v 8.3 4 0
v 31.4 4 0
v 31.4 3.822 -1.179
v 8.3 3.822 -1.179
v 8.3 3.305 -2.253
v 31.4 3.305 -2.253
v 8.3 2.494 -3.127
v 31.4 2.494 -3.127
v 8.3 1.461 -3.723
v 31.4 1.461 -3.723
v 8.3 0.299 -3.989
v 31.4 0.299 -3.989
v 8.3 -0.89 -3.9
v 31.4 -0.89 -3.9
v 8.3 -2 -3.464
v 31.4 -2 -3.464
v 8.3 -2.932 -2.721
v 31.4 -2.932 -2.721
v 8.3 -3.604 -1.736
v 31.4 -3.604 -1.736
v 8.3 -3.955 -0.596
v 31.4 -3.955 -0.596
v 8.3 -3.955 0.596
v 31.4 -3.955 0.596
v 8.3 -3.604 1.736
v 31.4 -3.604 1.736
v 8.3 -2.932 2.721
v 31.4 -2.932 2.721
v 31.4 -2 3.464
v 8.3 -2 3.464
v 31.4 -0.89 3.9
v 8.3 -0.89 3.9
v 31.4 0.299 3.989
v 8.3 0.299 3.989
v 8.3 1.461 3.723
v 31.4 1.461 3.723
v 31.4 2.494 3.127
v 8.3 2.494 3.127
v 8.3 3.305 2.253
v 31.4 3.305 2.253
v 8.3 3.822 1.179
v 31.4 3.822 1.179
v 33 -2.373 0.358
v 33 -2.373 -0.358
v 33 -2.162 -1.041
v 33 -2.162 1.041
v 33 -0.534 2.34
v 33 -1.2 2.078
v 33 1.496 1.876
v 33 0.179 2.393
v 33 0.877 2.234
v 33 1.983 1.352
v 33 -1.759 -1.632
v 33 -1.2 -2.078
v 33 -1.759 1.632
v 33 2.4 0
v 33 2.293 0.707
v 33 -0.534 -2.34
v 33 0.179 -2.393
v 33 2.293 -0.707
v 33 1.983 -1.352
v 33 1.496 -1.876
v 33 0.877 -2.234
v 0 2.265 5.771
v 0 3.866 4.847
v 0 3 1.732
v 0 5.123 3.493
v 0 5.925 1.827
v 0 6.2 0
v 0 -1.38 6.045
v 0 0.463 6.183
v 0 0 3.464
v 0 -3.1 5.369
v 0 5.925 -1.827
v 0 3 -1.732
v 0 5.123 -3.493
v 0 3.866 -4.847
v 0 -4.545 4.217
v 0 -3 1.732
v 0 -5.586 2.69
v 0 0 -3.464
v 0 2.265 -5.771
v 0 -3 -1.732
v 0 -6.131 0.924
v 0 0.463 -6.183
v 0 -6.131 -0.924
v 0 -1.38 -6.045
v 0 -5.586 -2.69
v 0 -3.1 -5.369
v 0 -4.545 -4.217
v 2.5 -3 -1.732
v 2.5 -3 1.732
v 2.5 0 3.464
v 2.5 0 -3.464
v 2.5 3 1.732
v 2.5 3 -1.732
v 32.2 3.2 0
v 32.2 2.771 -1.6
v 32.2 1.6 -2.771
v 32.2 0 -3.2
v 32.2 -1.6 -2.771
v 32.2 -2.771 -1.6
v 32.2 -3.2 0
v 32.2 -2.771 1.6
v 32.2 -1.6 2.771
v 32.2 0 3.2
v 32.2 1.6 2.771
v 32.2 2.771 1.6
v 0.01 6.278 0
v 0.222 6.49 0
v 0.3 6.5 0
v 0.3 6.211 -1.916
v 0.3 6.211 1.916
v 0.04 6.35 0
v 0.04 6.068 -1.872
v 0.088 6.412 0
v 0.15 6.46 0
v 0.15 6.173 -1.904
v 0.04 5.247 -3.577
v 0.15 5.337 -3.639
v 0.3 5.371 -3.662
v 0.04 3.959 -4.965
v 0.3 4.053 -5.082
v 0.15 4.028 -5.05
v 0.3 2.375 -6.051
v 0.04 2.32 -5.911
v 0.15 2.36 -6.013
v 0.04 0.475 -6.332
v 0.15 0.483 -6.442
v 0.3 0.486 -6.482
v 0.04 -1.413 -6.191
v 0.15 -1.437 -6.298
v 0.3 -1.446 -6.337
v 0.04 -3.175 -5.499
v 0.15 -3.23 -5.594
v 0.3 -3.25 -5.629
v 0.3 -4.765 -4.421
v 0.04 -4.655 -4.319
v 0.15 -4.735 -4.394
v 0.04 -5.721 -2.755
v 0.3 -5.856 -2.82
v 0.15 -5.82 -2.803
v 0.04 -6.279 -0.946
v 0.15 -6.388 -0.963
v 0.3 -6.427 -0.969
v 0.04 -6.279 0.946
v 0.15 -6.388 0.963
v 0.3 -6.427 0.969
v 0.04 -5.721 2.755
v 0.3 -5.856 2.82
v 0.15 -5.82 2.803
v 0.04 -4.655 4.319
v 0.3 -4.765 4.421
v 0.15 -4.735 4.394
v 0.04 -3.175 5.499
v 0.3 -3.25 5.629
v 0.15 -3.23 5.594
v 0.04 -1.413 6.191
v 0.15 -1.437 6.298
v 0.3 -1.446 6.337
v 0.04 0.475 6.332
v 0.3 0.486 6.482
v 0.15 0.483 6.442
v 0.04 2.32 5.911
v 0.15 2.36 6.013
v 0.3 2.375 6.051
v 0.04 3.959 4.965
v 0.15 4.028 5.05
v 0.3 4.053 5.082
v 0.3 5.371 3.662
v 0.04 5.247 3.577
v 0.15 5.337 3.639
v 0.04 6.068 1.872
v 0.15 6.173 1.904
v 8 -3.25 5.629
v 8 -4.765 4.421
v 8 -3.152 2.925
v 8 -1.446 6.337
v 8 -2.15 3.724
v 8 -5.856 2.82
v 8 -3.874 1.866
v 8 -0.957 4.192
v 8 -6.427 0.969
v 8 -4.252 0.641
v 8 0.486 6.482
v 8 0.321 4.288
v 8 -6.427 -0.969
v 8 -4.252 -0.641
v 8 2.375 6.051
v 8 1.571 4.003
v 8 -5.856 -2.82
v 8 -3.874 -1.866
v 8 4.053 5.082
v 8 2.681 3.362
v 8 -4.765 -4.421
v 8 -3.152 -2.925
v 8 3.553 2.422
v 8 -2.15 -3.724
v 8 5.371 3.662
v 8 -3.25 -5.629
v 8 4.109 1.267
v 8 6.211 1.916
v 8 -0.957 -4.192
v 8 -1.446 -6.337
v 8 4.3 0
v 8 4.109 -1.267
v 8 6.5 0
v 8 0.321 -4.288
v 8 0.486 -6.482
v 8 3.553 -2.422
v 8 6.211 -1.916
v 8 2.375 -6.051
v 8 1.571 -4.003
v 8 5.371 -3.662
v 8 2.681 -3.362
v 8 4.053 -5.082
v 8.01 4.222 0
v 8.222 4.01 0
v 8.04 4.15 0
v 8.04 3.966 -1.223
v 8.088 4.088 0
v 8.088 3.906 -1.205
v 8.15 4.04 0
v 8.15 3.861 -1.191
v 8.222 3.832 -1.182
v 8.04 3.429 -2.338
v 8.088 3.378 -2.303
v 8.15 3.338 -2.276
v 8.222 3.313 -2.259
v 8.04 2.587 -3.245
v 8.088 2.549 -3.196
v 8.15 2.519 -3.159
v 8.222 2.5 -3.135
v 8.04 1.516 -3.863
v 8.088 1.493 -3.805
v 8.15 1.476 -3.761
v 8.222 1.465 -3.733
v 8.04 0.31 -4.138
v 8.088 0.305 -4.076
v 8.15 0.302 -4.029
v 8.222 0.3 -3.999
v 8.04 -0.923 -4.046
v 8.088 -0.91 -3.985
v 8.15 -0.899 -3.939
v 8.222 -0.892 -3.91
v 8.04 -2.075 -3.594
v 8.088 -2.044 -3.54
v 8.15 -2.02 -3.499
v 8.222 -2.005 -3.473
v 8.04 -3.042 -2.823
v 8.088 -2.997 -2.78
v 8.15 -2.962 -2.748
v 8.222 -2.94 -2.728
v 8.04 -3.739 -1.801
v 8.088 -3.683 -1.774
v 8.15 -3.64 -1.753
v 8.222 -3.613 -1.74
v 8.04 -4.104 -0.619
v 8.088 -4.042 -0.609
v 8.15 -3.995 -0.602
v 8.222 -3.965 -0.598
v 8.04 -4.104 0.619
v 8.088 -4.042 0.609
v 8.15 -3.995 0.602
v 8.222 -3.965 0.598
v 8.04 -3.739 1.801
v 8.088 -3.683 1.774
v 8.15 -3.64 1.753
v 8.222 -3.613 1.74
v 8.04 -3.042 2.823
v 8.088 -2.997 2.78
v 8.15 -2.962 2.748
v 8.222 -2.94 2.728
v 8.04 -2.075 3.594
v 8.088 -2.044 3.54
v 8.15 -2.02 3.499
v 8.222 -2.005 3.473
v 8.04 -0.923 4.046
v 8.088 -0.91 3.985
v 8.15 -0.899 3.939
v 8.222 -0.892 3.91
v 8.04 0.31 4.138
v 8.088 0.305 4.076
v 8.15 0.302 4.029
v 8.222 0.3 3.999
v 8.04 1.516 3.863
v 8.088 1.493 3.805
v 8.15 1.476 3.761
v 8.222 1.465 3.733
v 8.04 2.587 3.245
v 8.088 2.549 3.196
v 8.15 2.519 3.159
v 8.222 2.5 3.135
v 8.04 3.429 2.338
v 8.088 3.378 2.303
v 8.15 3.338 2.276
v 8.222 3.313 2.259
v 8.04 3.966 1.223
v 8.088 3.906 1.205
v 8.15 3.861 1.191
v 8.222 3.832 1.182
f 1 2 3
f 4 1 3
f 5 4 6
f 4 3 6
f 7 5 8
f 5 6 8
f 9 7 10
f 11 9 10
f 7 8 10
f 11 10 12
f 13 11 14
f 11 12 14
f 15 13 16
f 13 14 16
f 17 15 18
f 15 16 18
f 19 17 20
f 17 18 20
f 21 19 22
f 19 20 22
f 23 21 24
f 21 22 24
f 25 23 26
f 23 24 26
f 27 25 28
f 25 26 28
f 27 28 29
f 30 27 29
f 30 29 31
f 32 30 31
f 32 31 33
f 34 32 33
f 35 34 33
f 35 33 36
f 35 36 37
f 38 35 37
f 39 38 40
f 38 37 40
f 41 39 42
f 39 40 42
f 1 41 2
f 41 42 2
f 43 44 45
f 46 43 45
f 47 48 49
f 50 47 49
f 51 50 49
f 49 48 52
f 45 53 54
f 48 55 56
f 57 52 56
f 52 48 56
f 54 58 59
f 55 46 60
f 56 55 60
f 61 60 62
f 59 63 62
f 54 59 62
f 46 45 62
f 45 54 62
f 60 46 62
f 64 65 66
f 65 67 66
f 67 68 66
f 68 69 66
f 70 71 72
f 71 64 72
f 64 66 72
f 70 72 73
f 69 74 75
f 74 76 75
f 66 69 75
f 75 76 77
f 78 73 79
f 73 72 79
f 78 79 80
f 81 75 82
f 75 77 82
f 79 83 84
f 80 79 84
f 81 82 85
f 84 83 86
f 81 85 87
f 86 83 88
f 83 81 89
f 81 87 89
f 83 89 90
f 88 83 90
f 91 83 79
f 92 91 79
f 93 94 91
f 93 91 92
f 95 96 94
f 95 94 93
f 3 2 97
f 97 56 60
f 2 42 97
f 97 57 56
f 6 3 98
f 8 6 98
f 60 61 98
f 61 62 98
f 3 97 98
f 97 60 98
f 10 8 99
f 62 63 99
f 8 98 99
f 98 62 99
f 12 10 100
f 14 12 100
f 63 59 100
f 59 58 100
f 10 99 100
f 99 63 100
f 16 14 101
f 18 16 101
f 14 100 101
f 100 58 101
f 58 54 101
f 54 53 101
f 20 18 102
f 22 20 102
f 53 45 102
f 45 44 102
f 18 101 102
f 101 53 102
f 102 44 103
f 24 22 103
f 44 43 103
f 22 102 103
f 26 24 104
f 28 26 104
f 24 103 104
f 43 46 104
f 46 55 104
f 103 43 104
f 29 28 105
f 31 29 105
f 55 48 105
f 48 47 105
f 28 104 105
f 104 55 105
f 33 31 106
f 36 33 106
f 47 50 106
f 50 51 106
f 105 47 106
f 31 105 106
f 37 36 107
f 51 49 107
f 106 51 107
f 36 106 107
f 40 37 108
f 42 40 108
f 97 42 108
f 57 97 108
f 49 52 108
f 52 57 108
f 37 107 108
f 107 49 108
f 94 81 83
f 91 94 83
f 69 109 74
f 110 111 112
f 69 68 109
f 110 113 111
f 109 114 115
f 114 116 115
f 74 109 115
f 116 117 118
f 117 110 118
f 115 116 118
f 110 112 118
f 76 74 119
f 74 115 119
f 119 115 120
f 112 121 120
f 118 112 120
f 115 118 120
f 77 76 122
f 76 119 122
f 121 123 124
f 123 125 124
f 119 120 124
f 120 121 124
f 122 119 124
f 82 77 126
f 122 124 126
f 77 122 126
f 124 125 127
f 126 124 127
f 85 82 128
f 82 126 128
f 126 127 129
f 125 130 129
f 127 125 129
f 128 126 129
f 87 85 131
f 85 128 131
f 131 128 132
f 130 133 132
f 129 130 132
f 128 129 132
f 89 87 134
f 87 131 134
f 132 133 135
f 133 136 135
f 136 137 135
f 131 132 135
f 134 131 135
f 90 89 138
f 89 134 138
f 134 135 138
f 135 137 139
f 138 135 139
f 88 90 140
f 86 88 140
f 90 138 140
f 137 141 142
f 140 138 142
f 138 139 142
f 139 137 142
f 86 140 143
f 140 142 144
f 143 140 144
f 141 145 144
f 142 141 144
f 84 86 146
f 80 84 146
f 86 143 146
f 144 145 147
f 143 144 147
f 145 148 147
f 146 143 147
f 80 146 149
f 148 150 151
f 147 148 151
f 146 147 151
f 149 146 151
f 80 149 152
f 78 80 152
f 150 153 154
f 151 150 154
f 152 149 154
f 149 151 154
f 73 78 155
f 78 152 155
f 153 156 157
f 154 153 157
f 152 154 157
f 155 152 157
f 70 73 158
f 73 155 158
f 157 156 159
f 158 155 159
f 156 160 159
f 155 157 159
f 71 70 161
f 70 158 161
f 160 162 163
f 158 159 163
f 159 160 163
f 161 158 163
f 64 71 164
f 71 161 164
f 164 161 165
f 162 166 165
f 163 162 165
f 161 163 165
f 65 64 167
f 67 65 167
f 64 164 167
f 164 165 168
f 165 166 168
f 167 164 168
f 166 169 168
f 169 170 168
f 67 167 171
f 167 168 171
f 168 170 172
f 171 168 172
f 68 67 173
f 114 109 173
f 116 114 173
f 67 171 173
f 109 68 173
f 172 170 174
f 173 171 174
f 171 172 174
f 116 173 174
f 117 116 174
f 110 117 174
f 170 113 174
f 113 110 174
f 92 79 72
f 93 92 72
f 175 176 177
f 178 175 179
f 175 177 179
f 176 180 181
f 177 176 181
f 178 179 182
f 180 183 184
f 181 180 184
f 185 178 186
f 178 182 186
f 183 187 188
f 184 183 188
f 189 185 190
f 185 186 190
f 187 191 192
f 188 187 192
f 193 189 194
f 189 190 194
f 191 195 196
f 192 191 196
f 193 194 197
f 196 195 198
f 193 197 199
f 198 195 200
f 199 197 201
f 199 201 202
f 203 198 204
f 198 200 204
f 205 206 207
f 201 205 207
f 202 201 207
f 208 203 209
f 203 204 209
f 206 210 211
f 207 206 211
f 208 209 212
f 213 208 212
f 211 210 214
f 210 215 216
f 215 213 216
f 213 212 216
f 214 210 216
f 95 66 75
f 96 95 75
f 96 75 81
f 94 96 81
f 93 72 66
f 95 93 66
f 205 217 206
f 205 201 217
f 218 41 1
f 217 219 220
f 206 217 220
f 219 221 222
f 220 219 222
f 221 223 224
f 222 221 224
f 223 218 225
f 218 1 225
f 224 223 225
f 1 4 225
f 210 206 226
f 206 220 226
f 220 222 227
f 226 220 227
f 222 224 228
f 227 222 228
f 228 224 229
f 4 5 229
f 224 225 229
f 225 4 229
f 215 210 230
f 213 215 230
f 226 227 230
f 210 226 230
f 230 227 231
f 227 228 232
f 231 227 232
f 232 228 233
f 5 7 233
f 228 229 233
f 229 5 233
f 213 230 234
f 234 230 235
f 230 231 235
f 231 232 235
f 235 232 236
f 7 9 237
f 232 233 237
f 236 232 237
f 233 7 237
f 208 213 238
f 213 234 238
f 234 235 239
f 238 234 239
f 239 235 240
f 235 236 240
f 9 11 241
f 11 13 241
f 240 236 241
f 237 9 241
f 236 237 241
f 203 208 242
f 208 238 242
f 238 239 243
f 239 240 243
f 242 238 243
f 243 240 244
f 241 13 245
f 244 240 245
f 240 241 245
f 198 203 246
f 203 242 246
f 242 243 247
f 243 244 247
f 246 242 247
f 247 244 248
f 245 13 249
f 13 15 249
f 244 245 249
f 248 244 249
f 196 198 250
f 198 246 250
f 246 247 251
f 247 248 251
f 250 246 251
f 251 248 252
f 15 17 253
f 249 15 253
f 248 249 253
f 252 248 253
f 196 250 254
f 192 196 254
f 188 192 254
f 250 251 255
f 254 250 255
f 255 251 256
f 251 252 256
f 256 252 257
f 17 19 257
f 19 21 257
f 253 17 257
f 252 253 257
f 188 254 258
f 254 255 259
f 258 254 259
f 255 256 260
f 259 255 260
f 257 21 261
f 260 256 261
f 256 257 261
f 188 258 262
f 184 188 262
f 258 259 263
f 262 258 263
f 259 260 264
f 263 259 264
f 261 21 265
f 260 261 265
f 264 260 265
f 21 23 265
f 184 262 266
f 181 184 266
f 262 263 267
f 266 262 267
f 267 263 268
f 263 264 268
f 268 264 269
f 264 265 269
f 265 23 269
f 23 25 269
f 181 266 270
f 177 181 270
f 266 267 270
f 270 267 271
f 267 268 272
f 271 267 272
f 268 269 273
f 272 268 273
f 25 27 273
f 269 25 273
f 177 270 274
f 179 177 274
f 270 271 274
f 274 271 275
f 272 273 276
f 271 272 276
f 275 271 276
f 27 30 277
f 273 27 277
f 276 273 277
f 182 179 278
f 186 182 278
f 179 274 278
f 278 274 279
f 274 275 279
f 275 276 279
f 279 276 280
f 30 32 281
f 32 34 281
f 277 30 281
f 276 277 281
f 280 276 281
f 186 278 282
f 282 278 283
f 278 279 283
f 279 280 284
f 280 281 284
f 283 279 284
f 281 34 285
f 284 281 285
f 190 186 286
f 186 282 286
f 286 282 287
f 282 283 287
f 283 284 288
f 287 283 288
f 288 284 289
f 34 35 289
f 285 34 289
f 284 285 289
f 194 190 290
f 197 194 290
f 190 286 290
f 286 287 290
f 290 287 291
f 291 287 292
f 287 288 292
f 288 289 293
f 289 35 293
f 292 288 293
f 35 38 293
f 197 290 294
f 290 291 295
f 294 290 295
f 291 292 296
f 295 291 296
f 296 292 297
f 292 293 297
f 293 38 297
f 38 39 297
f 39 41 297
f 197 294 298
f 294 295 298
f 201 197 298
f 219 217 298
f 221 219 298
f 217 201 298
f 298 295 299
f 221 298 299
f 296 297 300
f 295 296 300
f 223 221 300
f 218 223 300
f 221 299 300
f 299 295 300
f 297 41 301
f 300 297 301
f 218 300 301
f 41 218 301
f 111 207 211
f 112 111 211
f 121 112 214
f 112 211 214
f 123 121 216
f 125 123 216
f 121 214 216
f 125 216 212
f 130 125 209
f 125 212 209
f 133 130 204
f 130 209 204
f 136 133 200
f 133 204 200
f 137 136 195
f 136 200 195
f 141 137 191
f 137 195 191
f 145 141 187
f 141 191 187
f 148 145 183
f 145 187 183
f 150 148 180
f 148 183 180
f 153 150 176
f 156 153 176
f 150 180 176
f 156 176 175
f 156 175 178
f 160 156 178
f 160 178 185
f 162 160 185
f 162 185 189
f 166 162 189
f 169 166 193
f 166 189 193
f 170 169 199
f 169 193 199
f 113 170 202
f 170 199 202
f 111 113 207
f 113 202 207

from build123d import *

# Parameters (mm, degrees)
CUT_EXTRUDE_1_DEPTH = 2.5
FILLET_1_R          = 0.3
CHAMFER_1_SIZE      = 1.6


with BuildPart() as part:
    # Эскиз1 → Повернуть1 (revolve)
    with BuildSketch(Plane.XY):
        Polygon((0, 0), (0, 6.5), (8, 6.5), (8, 4), (33, 4), (33, 0), align=None)
    revolve(axis=Axis((33, 0, 0), (-1, 0, 0)))

    # Эскиз2 → Вырез-Вытянуть1 (cut)
    with BuildSketch(Plane.ZY):
        Polygon((-1.732050808, 3), (-3.464101615, 0), (-1.732050808, -3), (1.732050808, -3), (3.464101615, 0), (1.732050808, 3), align=None)
    extrude(amount=-CUT_EXTRUDE_1_DEPTH, mode=Mode.SUBTRACT)

    # Скругление1
    fillet_1_edges = [part.edges().sort_by_distance(p)[0] for p in [
        (8, -4, 0),
        (0, -6.5, 0),
    ]]
    fillet(fillet_1_edges, radius=FILLET_1_R)

    # Фаска1
    chamfer_1_edges = [part.edges().sort_by_distance(p)[0] for p in [
        (33, -4, 0),
    ]]
    chamfer(chamfer_1_edges, length=CHAMFER_1_SIZE)


solid = part.part
